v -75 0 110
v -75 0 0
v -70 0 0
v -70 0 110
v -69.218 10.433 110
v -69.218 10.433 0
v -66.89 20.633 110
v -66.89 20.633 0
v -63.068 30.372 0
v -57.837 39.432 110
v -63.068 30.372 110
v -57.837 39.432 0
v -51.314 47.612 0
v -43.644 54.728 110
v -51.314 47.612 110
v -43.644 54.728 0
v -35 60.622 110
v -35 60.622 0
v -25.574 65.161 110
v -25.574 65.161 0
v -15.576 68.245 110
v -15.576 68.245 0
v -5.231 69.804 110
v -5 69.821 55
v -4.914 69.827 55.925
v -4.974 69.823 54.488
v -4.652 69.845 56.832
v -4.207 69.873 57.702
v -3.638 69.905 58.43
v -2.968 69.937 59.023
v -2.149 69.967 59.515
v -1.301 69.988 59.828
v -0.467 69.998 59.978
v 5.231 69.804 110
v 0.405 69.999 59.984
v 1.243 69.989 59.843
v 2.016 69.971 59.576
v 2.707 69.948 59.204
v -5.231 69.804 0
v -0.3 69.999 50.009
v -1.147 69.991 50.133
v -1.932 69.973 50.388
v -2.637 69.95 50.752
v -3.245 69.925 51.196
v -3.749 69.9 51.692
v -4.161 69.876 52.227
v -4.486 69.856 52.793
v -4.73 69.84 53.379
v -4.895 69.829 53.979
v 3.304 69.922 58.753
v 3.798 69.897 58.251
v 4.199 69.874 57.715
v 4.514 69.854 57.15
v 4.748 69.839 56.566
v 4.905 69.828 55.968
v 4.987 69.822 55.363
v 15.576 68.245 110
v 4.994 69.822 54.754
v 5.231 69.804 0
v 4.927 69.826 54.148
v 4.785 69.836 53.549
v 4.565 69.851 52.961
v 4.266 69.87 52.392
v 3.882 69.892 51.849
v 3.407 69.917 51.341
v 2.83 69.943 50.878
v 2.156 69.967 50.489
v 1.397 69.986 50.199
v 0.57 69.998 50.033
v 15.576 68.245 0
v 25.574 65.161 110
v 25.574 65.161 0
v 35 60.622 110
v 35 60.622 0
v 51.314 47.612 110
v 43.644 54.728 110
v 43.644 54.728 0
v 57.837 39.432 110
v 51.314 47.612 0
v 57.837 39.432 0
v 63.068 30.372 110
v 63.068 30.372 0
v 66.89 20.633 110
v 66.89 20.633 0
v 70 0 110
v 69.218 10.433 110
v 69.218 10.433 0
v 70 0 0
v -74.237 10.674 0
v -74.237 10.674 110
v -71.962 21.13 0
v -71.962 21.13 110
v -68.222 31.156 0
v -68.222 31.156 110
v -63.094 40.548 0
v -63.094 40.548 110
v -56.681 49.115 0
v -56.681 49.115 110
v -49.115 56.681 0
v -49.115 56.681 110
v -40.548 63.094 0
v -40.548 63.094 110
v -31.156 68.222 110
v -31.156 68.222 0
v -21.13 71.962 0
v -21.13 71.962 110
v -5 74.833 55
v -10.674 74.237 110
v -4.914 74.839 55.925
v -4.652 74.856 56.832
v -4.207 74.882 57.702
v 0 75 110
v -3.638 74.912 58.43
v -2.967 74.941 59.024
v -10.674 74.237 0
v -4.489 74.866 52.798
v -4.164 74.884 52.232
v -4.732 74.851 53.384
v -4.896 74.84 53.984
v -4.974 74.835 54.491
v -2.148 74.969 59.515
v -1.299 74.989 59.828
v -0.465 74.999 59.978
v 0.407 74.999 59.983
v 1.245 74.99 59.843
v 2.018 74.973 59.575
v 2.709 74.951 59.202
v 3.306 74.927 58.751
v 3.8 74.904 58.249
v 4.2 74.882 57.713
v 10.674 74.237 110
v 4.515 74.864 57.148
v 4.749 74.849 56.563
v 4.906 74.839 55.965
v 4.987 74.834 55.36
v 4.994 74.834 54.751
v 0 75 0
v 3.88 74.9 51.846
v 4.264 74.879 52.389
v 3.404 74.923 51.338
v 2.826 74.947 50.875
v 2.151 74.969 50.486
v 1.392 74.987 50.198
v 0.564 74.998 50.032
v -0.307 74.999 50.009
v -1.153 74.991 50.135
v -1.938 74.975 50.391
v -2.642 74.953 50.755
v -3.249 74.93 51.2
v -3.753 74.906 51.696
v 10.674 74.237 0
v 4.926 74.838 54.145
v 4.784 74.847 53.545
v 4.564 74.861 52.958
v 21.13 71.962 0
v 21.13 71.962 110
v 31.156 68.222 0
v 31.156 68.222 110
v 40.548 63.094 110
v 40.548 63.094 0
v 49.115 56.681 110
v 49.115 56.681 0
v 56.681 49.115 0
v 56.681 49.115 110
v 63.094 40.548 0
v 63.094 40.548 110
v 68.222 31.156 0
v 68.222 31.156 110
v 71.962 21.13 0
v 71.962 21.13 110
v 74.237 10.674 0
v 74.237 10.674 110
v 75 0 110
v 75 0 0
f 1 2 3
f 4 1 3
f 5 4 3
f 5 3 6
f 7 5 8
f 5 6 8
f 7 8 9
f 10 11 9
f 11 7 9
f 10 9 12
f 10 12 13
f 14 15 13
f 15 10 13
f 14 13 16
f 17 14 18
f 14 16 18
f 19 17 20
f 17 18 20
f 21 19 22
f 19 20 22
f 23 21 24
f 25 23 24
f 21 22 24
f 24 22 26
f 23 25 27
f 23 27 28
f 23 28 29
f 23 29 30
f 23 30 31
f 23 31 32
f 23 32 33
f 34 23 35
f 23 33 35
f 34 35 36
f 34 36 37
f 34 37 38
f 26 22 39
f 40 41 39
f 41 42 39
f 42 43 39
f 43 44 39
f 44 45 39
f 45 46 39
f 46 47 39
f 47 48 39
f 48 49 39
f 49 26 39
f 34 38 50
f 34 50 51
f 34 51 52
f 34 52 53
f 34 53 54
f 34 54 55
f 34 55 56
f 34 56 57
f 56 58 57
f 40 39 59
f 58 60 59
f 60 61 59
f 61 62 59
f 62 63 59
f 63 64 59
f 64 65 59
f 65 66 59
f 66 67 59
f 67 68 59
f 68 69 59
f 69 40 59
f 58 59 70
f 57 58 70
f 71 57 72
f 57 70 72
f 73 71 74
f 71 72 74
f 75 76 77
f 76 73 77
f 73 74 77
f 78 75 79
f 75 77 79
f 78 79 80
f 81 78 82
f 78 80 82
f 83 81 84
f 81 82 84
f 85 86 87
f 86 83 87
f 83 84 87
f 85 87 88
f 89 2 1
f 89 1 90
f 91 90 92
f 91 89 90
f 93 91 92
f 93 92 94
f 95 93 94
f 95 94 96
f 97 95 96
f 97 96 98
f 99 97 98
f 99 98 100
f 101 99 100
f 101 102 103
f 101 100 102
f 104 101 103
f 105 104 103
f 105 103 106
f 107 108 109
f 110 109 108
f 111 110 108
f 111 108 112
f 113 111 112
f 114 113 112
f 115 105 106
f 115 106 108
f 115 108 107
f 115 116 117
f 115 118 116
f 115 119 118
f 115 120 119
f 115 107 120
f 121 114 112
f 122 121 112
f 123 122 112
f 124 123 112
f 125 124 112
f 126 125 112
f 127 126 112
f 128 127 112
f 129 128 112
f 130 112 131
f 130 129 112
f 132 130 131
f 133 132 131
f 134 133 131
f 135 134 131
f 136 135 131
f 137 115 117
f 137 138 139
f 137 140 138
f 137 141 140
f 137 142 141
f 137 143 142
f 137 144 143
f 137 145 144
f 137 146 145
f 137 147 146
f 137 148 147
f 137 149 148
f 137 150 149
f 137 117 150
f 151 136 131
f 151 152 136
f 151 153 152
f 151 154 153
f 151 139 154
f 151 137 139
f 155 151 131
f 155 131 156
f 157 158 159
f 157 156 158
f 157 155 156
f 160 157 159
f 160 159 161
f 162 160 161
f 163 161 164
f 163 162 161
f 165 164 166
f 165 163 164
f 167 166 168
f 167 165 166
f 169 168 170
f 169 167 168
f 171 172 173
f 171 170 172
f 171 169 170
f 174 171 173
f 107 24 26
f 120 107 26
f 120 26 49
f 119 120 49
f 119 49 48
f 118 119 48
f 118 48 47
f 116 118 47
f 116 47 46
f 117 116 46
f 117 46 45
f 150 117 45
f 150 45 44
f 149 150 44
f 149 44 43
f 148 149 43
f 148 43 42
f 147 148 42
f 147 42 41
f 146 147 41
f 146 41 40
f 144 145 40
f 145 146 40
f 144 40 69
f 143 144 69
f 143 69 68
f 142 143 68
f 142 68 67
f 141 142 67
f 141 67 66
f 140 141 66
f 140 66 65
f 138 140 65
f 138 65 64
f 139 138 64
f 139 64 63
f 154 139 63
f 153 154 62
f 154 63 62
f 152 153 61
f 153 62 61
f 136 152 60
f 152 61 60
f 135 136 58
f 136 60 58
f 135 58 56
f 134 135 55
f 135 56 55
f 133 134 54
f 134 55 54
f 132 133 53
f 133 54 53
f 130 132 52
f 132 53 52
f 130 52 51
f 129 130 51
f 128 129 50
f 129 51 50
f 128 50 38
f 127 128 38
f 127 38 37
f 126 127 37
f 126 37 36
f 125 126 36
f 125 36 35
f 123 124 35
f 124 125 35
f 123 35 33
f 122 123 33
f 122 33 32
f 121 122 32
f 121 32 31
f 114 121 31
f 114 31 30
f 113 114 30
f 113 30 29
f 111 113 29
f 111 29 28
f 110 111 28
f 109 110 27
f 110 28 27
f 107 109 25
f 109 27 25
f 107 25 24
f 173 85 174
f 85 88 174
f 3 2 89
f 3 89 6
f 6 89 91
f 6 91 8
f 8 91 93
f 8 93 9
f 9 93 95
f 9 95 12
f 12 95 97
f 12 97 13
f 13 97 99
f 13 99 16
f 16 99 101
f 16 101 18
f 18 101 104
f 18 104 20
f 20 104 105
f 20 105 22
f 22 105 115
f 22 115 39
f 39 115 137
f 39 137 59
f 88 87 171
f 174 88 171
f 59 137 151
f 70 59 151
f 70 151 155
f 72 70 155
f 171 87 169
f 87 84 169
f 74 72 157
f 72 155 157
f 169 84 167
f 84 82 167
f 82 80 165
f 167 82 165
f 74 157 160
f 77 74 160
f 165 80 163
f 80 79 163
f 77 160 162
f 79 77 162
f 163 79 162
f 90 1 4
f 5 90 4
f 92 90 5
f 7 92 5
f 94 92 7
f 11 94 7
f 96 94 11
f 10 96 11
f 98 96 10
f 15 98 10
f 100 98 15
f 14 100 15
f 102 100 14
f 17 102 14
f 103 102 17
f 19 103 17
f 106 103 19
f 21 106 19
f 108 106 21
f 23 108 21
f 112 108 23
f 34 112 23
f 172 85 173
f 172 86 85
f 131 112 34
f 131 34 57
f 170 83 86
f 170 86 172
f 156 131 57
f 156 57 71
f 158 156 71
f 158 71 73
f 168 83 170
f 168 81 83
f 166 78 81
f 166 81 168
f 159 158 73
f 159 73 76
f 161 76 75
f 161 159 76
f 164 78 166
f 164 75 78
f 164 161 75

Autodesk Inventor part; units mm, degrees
ref_plane "YZ Plane" through (0, 0, 0) normal (1, 0, 0) x (0, 1, 0)
ref_plane "XZ Plane" through (0, 0, 0) normal (0, 1, 0) x (-1, 0, 0)
ref_plane "XY Plane" through (0, 0, 0) normal (0, 0, 1) x (1, 0, 0)
sketch "Эскиз1" plane through (0, 0, 0) normal (0, 0, 1) x (1, 0, 0)
  circle A0 centre (0, 0) radius 75
  circle A1 centre (0, 0) radius 70
  line L0 (-75, 0) -> (75, 0)
  point P0 (70, 0)
  point P1 (-70, 0)
  dimension "d0" = 150
  dimension "d1" = 140
extrude "Выдавливание1" add sketch "Эскиз1" along normal blind 110 contours L0 A1 A0 picked at (0, 71.5073)
sketch "Эскиз2" plane through (0, 0, 0) normal (0, 1, 0) x (-1, 0, 0)
  line L0 (-75, 0) -> (75, 0) projected
  line L1 (75, 0) -> (75, 110) projected
  line L2 (-75, 110) -> (75, 110) projected
  line L3 (-75, 0) -> (-75, 110) projected
  circle A0 centre (0, 55) radius 5
  point P0 (0, 0)
  dimension "d4" = 10
extrude "Выдавливание2" cut sketch "Эскиз2" along normal blind 110 contours A0
properties part number "Под шатун" material "Бронза, литейная"
